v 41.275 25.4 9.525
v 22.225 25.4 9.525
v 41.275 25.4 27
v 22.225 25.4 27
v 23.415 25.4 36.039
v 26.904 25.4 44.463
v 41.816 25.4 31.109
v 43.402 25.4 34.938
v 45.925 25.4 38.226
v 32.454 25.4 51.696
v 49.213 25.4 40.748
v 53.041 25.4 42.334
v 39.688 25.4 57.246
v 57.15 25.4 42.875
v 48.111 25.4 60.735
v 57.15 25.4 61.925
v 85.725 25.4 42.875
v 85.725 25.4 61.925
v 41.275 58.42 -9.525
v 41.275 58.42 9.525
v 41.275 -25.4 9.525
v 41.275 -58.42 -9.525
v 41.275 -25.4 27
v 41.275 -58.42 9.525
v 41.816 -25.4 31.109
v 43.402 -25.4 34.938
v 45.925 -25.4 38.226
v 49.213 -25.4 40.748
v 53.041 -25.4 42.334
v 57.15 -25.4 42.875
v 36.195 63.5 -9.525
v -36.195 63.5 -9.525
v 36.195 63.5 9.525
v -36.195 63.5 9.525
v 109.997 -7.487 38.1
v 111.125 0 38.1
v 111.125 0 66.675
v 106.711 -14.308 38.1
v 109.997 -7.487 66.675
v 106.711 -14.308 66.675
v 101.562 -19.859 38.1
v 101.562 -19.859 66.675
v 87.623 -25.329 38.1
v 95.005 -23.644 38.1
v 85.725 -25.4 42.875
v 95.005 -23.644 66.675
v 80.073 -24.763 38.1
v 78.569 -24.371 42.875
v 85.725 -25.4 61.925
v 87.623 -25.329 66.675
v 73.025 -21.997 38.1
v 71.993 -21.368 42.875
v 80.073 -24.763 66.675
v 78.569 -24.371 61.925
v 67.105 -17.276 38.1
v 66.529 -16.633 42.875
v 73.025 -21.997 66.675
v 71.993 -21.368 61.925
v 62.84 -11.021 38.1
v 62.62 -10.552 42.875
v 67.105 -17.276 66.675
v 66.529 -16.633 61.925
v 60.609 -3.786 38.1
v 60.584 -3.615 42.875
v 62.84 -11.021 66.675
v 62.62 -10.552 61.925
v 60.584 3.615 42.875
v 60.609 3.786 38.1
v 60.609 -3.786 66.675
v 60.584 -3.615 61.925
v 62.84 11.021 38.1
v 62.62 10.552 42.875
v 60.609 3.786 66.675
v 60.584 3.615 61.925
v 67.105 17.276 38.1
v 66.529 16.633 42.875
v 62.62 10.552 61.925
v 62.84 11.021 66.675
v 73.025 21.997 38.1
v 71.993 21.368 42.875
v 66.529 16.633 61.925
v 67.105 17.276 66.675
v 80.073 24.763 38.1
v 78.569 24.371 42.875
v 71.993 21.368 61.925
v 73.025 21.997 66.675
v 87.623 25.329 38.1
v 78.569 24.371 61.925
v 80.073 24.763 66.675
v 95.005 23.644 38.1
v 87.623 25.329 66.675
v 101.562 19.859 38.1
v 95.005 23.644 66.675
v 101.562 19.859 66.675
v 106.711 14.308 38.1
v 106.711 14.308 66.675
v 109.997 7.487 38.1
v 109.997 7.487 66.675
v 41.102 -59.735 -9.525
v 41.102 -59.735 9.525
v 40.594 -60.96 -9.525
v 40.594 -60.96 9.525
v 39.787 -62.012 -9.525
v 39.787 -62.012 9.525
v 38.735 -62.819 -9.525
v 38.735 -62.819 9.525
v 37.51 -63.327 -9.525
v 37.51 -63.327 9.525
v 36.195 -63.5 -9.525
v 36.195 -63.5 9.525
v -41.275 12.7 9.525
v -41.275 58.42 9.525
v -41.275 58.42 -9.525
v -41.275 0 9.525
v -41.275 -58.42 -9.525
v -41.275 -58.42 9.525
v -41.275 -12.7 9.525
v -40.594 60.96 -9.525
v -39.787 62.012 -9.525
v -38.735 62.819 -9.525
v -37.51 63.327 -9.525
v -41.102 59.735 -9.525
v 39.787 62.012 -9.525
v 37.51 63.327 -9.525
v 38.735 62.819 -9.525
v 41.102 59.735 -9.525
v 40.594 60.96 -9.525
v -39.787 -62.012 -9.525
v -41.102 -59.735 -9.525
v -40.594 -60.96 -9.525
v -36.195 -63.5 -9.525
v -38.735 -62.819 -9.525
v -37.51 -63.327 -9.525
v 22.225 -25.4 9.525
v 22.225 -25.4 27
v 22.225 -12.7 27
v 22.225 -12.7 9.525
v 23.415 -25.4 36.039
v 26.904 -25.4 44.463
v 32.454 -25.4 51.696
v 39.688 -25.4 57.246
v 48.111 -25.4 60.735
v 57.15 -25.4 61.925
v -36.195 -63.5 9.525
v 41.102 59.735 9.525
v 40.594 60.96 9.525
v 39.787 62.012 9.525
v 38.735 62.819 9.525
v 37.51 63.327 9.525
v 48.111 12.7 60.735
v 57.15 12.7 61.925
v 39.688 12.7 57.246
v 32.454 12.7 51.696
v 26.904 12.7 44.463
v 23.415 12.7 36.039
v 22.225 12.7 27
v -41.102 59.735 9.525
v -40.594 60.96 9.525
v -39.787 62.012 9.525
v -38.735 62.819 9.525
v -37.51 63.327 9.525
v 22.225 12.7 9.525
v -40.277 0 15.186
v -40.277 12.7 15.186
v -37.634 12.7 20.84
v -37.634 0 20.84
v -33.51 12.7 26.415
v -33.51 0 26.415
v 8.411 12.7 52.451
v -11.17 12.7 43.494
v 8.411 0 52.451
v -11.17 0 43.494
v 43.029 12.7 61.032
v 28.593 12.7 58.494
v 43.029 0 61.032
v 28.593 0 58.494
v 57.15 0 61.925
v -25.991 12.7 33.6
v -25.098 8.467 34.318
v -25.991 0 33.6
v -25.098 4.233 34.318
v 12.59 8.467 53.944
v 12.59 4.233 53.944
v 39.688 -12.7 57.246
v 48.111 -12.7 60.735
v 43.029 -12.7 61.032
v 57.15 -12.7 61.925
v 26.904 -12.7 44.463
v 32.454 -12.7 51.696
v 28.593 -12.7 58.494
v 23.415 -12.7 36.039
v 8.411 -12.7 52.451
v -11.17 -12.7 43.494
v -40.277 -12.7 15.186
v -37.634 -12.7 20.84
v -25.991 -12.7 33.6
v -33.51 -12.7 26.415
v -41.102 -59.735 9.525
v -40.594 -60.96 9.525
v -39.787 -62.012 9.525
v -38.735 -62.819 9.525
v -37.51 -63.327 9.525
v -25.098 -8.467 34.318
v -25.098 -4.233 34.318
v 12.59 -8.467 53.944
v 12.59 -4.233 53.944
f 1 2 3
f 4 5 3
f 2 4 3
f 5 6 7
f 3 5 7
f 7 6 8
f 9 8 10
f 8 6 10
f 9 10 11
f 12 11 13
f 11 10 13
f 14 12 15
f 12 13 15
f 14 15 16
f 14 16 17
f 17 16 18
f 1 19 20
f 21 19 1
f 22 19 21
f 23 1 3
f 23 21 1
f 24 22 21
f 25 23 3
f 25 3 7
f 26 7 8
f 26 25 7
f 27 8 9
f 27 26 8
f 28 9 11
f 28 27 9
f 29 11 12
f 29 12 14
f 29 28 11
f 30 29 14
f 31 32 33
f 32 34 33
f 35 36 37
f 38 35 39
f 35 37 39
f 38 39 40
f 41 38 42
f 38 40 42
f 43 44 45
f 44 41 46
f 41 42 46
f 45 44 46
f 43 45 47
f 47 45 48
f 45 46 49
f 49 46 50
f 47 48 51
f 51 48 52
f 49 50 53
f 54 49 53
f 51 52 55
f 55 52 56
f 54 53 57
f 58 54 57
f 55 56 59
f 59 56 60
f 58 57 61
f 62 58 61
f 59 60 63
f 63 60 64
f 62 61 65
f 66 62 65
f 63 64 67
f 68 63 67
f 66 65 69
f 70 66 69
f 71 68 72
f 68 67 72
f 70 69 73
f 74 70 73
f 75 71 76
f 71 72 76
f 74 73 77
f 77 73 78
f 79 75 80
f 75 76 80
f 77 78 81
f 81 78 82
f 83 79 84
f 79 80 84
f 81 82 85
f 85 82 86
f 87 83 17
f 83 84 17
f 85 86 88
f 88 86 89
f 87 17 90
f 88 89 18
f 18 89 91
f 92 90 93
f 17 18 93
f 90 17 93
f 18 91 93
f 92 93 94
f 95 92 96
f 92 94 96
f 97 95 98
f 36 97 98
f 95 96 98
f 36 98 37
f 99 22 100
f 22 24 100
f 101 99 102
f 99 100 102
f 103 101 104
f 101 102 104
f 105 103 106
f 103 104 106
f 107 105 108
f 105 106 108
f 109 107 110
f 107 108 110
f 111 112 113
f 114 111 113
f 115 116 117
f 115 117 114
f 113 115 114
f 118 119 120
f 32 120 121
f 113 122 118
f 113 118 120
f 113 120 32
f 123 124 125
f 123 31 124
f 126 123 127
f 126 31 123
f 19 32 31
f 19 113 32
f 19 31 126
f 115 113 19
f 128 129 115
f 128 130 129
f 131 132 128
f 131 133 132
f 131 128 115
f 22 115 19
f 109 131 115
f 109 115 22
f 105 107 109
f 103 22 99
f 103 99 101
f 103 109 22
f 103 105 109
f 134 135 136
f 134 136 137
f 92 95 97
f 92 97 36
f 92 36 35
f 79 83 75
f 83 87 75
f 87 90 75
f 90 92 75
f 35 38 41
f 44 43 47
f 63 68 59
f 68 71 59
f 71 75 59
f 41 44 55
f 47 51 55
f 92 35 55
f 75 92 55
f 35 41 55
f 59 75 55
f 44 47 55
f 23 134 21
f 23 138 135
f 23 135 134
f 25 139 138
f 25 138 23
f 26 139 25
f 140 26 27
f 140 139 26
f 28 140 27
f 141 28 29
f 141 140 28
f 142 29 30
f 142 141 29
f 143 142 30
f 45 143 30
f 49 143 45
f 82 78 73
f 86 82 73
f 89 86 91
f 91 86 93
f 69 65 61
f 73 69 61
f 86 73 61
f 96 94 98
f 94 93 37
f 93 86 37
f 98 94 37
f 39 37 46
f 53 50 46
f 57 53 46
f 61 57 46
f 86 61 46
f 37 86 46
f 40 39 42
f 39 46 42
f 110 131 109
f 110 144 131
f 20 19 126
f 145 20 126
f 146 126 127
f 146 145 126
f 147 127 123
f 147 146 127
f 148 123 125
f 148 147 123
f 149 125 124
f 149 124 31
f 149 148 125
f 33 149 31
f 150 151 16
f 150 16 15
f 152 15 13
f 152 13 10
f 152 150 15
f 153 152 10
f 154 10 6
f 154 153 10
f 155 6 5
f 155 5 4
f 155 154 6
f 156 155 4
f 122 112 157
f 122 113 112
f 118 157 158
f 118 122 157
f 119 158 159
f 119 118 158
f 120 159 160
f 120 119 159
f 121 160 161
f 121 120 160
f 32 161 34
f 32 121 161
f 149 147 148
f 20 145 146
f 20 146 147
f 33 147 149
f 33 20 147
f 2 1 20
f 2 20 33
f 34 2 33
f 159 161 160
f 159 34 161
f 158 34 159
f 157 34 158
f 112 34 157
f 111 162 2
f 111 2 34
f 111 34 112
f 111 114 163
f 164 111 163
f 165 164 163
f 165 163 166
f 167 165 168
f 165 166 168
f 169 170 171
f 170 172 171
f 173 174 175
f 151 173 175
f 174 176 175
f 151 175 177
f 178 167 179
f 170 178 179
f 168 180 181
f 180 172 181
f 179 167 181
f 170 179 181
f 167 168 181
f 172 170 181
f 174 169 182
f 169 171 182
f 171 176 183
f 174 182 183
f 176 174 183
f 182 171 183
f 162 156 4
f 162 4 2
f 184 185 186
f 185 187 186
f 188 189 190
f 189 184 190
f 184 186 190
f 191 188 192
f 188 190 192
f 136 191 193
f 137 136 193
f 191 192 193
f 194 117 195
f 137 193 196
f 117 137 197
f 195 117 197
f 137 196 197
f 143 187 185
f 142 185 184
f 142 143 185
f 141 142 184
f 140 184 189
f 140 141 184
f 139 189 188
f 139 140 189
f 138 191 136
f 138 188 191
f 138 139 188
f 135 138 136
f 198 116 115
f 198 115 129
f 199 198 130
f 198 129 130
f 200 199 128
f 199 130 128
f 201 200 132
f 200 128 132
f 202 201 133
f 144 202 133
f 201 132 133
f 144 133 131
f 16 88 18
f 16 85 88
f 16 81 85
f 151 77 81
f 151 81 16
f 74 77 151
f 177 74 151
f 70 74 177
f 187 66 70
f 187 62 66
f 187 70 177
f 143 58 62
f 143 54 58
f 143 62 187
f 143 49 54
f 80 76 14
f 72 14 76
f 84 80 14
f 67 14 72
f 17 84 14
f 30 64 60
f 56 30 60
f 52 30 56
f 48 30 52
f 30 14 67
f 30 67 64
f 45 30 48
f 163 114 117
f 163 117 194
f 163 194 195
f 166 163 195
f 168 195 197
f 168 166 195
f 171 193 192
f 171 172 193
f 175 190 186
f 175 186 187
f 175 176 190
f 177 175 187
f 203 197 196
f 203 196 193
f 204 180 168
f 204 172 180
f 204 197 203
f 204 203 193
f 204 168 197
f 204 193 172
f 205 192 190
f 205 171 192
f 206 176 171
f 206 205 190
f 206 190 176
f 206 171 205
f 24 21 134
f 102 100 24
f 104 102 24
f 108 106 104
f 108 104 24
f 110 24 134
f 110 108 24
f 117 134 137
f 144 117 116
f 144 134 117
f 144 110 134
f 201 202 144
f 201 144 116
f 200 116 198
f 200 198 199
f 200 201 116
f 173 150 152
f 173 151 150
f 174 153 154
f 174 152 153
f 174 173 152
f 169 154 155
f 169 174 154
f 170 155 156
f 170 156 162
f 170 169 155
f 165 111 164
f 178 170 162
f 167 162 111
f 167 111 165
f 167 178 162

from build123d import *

# Parameters (mm, degrees)
F1_DEPTH = 63.5
F2_DEPTH = 25.4
F3_DEPTH = 12.7
F5_R     = 5.08


with BuildPart() as f1:
    # F0 (on Front) → F1 (new body, symmetric)
    with BuildSketch(Plane.XZ):
        Polygon((-41.275, 9.525), (-41.275, -9.525), (41.275, -9.525), (41.275, 9.525), (22.225, 9.525), align=None)
    extrude(amount=F1_DEPTH, both=True)

    # F0 (on Front) → F2 (join, symmetric)
    with BuildSketch(Plane.XZ):
        with BuildLine():
            Line((22.225, 9.525), (41.275, 9.525))
            Line((41.275, 9.525), (41.275, 27.0002))
            ThreePointArc((41.275, 27.0002), (45.92468, 38.22552), (57.15, 42.8752))
            Line((57.15, 42.8752), (60.325, 42.8752))
            Line((60.325, 42.8752), (60.325, 61.9252))
            Line((60.325, 61.9252), (57.15, 61.9252))
            ThreePointArc((57.15, 61.9252), (32.454296, 51.695904), (22.225, 27.0002))
            Line((22.225, 27.0002), (22.225, 9.525))
        make_face()
        Polygon((77.207536, 61.9252), (60.325, 61.9252), (60.325, 42.8752), (77.207536, 42.8752), (85.725, 42.8752), (85.725, 61.9252), align=None)
    extrude(amount=F2_DEPTH, both=True)

    # F0 (on Front) → F3 (join, symmetric)
    with BuildSketch(Plane.XZ):
        with BuildLine():
            add(Edge.make_bspline(
                [(-41.275, 9.525), (-40.73476, 34.741372), (14.03527, 61.9252), (57.15, 61.9252)],
                knots=[0, 0, 0, 0, 111.504536, 111.504536, 111.504536, 111.504536], degree=3))
            Line((-41.275, 9.525), (22.225, 9.525))
            Line((22.225, 9.525), (22.225, 27.0002))
            ThreePointArc((22.225, 27.0002), (32.454296, 51.695904), (57.15, 61.9252))
        make_face()
    extrude(amount=F3_DEPTH, both=True)

    # F0 (on Front) → F4 (revolve)
    with BuildSketch(Plane.XZ):
        Polygon((111.125, 66.675), (85.725, 66.675), (85.725, 61.9252), (85.725, 42.8752), (85.725, 38.1), (111.125, 38.1), align=None)
    revolve(axis=Axis((85.725, 0, 52.3875), (0, 0, -1)))

    # F5
    f5_edges = [f1.edges().sort_by_distance(p)[0] for p in [
        (41.275, -63.5, 0),
        (-41.275, -63.5, 0),
        (41.275, 63.5, 0),
        (-41.275, 63.5, 0),
    ]]
    fillet(f5_edges, radius=F5_R)


solid = f1.part
